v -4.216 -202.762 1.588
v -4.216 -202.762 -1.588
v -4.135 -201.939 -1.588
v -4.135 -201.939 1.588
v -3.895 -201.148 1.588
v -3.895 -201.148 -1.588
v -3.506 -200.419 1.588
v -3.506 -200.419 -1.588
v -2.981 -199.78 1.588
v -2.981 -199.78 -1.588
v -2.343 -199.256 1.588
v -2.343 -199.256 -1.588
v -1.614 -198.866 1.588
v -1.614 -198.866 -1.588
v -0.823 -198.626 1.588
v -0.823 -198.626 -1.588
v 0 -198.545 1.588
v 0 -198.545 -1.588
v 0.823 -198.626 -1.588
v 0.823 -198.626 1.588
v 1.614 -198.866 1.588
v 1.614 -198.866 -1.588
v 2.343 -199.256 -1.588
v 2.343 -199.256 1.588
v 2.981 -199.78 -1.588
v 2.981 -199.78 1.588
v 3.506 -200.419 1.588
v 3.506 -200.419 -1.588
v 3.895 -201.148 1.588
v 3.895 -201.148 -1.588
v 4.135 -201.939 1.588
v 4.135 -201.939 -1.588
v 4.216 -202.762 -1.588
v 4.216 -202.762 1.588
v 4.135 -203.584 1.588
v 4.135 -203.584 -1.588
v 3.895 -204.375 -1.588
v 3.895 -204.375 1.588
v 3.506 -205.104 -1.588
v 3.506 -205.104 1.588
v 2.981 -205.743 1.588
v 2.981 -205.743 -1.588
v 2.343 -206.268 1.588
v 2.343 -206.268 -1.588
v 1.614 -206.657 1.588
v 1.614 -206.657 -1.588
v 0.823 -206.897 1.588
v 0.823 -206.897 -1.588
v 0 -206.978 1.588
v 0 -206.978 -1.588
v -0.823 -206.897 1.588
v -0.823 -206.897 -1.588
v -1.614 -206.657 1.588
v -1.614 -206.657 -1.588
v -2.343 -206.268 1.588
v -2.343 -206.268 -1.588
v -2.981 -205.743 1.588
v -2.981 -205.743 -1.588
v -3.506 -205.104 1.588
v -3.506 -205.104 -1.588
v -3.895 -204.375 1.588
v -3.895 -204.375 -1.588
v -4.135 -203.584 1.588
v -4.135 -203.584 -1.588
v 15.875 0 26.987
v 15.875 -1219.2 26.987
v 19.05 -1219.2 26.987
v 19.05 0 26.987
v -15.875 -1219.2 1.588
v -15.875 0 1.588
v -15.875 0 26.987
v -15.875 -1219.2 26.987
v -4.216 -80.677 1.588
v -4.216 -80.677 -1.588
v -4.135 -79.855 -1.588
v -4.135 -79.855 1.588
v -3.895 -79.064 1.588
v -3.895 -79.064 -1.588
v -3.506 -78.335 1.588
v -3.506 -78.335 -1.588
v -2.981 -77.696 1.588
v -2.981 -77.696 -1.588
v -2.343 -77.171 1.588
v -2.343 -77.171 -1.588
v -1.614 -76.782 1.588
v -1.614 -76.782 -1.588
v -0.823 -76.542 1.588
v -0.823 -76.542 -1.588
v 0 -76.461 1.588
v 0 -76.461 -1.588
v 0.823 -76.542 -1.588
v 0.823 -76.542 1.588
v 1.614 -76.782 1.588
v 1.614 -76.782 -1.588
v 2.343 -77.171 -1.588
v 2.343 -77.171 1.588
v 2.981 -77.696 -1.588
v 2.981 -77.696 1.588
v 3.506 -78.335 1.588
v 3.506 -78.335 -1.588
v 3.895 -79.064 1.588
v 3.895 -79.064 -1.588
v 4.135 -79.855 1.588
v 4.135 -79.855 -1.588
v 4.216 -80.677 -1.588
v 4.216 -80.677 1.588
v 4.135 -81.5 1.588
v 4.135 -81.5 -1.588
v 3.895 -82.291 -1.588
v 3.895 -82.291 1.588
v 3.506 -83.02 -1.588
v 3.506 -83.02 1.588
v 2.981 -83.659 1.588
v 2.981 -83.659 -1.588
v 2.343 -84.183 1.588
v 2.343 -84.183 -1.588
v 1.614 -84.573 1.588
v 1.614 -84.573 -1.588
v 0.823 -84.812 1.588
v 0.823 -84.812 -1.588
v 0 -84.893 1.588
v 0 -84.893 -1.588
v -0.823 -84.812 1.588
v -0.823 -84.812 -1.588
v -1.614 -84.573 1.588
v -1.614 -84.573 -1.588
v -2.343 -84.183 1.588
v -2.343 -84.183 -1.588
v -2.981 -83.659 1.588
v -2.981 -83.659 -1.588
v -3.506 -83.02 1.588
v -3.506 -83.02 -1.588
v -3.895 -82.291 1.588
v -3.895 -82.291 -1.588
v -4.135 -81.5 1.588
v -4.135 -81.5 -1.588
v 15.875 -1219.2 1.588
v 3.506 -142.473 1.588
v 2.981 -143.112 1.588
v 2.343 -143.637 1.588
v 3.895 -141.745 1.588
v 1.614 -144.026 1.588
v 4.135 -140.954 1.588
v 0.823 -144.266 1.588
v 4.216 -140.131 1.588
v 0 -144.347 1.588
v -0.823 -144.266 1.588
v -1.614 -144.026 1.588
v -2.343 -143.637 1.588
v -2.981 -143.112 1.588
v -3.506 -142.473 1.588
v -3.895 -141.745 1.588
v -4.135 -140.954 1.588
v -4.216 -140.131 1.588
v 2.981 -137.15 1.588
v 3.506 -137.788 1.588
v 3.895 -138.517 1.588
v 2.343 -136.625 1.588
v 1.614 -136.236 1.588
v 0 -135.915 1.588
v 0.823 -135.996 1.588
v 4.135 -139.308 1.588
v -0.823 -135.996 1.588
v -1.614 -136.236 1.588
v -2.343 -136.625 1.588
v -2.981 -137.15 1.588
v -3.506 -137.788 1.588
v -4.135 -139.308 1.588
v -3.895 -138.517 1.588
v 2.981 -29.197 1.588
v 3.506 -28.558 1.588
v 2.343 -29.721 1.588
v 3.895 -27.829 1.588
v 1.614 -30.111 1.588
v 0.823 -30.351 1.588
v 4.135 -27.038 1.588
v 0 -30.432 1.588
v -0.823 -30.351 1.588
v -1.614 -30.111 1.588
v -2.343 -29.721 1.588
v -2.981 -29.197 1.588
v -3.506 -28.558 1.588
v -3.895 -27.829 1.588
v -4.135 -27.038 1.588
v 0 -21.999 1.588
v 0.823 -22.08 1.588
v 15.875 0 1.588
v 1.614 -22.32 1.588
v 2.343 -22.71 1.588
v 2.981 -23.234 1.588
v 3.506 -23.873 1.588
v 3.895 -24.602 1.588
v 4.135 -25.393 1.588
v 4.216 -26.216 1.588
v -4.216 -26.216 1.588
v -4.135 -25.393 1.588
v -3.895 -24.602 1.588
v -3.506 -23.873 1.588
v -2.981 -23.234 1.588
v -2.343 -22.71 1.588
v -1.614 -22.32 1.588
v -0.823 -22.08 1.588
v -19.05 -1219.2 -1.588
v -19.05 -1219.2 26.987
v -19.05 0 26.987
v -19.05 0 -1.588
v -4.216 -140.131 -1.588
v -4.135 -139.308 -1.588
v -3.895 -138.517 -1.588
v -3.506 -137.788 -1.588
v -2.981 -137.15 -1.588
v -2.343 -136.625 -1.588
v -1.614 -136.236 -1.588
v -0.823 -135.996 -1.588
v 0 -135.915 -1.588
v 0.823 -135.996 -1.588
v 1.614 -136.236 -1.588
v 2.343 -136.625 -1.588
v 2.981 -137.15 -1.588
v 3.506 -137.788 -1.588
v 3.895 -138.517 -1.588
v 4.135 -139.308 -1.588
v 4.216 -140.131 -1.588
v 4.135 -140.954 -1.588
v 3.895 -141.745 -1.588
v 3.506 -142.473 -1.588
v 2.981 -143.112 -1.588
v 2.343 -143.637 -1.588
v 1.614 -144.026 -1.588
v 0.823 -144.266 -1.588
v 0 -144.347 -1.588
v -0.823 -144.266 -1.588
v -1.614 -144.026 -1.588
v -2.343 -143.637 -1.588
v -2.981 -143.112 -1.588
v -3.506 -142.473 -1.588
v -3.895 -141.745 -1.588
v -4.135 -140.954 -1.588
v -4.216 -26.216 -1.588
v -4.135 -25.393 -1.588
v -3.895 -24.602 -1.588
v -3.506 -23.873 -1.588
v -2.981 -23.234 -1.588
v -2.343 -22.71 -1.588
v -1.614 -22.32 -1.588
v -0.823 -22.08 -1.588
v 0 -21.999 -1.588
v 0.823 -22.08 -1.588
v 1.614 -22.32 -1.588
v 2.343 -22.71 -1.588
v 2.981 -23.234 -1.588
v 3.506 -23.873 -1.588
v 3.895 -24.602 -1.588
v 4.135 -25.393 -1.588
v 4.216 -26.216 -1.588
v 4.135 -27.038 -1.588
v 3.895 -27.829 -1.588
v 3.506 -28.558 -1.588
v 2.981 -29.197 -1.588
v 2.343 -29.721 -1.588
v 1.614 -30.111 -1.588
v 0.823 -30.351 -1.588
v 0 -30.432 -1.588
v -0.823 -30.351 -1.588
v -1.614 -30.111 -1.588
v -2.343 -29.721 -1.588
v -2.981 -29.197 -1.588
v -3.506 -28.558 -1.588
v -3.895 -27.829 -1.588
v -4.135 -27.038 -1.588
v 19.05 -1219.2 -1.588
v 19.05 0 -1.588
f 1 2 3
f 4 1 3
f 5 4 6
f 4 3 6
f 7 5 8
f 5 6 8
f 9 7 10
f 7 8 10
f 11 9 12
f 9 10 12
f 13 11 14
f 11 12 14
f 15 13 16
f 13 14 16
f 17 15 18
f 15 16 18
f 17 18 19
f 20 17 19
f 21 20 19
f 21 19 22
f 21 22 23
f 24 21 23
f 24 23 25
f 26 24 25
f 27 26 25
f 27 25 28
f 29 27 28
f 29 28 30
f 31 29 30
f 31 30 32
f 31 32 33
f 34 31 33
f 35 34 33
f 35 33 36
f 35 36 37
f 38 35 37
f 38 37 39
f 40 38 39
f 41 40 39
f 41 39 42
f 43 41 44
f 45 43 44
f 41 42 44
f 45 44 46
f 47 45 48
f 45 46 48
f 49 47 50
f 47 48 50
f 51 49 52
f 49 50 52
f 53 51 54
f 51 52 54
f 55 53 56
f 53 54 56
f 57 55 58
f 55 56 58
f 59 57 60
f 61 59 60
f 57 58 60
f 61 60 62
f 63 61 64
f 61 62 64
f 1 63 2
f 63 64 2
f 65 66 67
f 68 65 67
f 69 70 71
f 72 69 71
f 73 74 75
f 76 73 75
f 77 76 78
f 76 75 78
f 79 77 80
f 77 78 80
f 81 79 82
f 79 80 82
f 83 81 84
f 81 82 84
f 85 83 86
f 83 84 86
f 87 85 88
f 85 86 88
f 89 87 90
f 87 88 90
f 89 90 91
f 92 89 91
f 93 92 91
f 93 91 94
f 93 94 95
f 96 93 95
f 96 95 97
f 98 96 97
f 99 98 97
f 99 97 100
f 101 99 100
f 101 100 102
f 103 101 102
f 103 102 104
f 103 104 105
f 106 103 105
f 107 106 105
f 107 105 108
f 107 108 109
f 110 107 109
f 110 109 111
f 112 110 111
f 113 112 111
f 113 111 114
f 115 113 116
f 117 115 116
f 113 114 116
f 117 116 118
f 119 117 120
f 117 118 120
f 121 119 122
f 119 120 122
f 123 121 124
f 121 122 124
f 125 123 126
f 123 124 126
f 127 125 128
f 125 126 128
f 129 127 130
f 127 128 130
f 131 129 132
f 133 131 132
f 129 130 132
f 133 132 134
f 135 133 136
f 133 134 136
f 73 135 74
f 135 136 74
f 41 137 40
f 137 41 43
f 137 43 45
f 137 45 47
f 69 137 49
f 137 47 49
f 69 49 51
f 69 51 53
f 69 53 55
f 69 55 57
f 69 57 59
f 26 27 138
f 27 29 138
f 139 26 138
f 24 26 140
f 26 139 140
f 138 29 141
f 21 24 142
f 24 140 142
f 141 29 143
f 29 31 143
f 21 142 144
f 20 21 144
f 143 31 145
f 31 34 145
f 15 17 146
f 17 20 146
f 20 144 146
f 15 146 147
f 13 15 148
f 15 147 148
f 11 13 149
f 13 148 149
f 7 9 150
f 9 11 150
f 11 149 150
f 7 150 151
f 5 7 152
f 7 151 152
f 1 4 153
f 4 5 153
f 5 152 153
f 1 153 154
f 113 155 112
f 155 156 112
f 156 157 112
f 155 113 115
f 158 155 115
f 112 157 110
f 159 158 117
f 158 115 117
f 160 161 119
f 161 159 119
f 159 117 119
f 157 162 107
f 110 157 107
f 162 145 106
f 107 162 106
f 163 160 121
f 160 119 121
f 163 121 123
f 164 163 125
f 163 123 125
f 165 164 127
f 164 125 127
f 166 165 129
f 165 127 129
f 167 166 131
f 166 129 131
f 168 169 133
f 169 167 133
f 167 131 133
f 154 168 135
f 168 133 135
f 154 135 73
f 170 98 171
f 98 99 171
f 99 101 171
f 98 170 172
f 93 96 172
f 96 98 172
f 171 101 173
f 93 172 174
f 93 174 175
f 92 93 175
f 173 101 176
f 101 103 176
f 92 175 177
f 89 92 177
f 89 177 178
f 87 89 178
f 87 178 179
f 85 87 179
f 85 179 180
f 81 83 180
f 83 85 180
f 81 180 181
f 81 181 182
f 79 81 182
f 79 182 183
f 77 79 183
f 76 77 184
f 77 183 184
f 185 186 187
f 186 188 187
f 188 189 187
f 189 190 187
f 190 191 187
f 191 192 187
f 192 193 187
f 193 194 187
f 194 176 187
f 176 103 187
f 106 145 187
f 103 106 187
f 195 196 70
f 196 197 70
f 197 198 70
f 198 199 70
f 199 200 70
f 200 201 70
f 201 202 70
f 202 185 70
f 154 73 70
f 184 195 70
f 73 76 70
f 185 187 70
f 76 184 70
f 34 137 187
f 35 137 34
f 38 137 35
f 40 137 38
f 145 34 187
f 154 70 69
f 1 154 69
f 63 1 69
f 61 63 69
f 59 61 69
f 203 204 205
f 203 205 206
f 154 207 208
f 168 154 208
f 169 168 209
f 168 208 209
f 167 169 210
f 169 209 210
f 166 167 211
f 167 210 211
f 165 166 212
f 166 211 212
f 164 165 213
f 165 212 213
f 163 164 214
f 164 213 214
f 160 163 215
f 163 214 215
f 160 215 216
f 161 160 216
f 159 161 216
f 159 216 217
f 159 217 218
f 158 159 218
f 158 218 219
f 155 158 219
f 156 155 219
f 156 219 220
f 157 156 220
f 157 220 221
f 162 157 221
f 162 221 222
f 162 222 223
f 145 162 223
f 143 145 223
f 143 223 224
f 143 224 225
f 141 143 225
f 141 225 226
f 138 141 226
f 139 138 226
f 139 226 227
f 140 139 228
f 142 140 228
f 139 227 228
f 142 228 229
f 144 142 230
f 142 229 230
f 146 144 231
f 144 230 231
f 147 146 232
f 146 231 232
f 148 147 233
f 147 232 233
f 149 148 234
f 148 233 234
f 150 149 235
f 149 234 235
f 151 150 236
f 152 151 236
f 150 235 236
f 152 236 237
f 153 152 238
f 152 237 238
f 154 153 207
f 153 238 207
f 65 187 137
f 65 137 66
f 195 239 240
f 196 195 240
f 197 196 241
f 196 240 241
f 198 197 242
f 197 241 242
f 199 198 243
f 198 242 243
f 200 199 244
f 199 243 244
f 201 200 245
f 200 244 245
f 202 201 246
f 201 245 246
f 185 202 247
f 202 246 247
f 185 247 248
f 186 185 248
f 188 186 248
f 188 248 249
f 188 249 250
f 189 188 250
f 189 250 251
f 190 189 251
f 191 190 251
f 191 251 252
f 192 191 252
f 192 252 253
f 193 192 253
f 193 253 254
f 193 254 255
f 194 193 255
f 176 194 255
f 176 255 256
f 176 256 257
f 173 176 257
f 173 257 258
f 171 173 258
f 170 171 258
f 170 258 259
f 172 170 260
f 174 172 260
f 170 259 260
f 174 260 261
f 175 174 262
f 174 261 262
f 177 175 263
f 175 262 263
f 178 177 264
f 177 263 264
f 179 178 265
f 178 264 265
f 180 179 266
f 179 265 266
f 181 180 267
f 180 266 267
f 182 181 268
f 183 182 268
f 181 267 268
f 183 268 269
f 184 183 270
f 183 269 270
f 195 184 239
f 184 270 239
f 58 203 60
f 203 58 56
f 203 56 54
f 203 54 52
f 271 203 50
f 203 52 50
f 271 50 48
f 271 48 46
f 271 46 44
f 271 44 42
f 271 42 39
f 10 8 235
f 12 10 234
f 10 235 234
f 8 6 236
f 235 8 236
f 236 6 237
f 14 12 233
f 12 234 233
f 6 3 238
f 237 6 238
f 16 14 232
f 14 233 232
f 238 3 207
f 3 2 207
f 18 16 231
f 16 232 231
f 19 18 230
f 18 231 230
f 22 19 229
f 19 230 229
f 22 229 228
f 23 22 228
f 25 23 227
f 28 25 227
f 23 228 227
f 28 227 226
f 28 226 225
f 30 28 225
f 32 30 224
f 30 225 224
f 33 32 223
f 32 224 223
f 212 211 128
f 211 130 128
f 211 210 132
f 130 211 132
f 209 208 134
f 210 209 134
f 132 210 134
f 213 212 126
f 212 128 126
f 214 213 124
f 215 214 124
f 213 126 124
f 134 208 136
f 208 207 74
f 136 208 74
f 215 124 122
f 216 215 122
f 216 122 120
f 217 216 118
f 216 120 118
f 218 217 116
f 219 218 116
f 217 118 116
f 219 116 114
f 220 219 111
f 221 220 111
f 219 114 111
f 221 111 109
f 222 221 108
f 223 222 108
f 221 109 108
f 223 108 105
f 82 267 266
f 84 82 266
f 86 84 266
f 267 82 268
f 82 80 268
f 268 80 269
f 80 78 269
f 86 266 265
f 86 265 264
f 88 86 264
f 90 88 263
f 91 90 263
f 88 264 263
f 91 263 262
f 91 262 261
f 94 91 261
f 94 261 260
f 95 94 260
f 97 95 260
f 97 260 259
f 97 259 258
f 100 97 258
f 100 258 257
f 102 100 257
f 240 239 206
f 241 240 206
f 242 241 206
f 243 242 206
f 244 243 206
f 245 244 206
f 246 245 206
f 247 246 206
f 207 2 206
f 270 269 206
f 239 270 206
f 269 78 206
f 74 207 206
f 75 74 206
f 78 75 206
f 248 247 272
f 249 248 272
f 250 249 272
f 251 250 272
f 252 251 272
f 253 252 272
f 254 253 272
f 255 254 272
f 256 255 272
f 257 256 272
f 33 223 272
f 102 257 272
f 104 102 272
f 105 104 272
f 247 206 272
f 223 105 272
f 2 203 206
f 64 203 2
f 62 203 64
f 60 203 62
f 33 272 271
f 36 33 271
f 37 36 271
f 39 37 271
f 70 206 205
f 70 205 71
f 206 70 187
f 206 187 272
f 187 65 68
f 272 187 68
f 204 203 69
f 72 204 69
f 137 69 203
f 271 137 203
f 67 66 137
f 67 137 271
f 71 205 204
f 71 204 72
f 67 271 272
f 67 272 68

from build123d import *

# Parameters (mm, degrees)
F0_W     = 3.175
F0_H     = 25.4
F1_DEPTH = 1219.2
F3_D     = 8.4328


with BuildPart() as f1:
    # F0 (on Front) → F1 (new body)
    with BuildSketch(Plane.XZ):
        with Locations((-17.4625, 14.2875)):
            Rectangle(F0_W, F0_H)
        with Locations((17.4625, 14.2875)):
            Rectangle(F0_W, F0_H)
        Polygon((-19.05, -1.5875), (19.05, -1.5875), (19.05, 1.5875), (15.875, 1.5875), (-15.875, 1.5875), (-19.05, 1.5875), align=None)
    extrude(amount=F1_DEPTH)

    # F3 (through all)
    with Locations(Plane.XY.offset(1.5875)):
        with Locations((0, -26.2155216187), (0, -80.6770920753), (0, -140.1309669018), (0, -202.7617692947)):
            Hole(F3_D / 2)


solid = f1.part
